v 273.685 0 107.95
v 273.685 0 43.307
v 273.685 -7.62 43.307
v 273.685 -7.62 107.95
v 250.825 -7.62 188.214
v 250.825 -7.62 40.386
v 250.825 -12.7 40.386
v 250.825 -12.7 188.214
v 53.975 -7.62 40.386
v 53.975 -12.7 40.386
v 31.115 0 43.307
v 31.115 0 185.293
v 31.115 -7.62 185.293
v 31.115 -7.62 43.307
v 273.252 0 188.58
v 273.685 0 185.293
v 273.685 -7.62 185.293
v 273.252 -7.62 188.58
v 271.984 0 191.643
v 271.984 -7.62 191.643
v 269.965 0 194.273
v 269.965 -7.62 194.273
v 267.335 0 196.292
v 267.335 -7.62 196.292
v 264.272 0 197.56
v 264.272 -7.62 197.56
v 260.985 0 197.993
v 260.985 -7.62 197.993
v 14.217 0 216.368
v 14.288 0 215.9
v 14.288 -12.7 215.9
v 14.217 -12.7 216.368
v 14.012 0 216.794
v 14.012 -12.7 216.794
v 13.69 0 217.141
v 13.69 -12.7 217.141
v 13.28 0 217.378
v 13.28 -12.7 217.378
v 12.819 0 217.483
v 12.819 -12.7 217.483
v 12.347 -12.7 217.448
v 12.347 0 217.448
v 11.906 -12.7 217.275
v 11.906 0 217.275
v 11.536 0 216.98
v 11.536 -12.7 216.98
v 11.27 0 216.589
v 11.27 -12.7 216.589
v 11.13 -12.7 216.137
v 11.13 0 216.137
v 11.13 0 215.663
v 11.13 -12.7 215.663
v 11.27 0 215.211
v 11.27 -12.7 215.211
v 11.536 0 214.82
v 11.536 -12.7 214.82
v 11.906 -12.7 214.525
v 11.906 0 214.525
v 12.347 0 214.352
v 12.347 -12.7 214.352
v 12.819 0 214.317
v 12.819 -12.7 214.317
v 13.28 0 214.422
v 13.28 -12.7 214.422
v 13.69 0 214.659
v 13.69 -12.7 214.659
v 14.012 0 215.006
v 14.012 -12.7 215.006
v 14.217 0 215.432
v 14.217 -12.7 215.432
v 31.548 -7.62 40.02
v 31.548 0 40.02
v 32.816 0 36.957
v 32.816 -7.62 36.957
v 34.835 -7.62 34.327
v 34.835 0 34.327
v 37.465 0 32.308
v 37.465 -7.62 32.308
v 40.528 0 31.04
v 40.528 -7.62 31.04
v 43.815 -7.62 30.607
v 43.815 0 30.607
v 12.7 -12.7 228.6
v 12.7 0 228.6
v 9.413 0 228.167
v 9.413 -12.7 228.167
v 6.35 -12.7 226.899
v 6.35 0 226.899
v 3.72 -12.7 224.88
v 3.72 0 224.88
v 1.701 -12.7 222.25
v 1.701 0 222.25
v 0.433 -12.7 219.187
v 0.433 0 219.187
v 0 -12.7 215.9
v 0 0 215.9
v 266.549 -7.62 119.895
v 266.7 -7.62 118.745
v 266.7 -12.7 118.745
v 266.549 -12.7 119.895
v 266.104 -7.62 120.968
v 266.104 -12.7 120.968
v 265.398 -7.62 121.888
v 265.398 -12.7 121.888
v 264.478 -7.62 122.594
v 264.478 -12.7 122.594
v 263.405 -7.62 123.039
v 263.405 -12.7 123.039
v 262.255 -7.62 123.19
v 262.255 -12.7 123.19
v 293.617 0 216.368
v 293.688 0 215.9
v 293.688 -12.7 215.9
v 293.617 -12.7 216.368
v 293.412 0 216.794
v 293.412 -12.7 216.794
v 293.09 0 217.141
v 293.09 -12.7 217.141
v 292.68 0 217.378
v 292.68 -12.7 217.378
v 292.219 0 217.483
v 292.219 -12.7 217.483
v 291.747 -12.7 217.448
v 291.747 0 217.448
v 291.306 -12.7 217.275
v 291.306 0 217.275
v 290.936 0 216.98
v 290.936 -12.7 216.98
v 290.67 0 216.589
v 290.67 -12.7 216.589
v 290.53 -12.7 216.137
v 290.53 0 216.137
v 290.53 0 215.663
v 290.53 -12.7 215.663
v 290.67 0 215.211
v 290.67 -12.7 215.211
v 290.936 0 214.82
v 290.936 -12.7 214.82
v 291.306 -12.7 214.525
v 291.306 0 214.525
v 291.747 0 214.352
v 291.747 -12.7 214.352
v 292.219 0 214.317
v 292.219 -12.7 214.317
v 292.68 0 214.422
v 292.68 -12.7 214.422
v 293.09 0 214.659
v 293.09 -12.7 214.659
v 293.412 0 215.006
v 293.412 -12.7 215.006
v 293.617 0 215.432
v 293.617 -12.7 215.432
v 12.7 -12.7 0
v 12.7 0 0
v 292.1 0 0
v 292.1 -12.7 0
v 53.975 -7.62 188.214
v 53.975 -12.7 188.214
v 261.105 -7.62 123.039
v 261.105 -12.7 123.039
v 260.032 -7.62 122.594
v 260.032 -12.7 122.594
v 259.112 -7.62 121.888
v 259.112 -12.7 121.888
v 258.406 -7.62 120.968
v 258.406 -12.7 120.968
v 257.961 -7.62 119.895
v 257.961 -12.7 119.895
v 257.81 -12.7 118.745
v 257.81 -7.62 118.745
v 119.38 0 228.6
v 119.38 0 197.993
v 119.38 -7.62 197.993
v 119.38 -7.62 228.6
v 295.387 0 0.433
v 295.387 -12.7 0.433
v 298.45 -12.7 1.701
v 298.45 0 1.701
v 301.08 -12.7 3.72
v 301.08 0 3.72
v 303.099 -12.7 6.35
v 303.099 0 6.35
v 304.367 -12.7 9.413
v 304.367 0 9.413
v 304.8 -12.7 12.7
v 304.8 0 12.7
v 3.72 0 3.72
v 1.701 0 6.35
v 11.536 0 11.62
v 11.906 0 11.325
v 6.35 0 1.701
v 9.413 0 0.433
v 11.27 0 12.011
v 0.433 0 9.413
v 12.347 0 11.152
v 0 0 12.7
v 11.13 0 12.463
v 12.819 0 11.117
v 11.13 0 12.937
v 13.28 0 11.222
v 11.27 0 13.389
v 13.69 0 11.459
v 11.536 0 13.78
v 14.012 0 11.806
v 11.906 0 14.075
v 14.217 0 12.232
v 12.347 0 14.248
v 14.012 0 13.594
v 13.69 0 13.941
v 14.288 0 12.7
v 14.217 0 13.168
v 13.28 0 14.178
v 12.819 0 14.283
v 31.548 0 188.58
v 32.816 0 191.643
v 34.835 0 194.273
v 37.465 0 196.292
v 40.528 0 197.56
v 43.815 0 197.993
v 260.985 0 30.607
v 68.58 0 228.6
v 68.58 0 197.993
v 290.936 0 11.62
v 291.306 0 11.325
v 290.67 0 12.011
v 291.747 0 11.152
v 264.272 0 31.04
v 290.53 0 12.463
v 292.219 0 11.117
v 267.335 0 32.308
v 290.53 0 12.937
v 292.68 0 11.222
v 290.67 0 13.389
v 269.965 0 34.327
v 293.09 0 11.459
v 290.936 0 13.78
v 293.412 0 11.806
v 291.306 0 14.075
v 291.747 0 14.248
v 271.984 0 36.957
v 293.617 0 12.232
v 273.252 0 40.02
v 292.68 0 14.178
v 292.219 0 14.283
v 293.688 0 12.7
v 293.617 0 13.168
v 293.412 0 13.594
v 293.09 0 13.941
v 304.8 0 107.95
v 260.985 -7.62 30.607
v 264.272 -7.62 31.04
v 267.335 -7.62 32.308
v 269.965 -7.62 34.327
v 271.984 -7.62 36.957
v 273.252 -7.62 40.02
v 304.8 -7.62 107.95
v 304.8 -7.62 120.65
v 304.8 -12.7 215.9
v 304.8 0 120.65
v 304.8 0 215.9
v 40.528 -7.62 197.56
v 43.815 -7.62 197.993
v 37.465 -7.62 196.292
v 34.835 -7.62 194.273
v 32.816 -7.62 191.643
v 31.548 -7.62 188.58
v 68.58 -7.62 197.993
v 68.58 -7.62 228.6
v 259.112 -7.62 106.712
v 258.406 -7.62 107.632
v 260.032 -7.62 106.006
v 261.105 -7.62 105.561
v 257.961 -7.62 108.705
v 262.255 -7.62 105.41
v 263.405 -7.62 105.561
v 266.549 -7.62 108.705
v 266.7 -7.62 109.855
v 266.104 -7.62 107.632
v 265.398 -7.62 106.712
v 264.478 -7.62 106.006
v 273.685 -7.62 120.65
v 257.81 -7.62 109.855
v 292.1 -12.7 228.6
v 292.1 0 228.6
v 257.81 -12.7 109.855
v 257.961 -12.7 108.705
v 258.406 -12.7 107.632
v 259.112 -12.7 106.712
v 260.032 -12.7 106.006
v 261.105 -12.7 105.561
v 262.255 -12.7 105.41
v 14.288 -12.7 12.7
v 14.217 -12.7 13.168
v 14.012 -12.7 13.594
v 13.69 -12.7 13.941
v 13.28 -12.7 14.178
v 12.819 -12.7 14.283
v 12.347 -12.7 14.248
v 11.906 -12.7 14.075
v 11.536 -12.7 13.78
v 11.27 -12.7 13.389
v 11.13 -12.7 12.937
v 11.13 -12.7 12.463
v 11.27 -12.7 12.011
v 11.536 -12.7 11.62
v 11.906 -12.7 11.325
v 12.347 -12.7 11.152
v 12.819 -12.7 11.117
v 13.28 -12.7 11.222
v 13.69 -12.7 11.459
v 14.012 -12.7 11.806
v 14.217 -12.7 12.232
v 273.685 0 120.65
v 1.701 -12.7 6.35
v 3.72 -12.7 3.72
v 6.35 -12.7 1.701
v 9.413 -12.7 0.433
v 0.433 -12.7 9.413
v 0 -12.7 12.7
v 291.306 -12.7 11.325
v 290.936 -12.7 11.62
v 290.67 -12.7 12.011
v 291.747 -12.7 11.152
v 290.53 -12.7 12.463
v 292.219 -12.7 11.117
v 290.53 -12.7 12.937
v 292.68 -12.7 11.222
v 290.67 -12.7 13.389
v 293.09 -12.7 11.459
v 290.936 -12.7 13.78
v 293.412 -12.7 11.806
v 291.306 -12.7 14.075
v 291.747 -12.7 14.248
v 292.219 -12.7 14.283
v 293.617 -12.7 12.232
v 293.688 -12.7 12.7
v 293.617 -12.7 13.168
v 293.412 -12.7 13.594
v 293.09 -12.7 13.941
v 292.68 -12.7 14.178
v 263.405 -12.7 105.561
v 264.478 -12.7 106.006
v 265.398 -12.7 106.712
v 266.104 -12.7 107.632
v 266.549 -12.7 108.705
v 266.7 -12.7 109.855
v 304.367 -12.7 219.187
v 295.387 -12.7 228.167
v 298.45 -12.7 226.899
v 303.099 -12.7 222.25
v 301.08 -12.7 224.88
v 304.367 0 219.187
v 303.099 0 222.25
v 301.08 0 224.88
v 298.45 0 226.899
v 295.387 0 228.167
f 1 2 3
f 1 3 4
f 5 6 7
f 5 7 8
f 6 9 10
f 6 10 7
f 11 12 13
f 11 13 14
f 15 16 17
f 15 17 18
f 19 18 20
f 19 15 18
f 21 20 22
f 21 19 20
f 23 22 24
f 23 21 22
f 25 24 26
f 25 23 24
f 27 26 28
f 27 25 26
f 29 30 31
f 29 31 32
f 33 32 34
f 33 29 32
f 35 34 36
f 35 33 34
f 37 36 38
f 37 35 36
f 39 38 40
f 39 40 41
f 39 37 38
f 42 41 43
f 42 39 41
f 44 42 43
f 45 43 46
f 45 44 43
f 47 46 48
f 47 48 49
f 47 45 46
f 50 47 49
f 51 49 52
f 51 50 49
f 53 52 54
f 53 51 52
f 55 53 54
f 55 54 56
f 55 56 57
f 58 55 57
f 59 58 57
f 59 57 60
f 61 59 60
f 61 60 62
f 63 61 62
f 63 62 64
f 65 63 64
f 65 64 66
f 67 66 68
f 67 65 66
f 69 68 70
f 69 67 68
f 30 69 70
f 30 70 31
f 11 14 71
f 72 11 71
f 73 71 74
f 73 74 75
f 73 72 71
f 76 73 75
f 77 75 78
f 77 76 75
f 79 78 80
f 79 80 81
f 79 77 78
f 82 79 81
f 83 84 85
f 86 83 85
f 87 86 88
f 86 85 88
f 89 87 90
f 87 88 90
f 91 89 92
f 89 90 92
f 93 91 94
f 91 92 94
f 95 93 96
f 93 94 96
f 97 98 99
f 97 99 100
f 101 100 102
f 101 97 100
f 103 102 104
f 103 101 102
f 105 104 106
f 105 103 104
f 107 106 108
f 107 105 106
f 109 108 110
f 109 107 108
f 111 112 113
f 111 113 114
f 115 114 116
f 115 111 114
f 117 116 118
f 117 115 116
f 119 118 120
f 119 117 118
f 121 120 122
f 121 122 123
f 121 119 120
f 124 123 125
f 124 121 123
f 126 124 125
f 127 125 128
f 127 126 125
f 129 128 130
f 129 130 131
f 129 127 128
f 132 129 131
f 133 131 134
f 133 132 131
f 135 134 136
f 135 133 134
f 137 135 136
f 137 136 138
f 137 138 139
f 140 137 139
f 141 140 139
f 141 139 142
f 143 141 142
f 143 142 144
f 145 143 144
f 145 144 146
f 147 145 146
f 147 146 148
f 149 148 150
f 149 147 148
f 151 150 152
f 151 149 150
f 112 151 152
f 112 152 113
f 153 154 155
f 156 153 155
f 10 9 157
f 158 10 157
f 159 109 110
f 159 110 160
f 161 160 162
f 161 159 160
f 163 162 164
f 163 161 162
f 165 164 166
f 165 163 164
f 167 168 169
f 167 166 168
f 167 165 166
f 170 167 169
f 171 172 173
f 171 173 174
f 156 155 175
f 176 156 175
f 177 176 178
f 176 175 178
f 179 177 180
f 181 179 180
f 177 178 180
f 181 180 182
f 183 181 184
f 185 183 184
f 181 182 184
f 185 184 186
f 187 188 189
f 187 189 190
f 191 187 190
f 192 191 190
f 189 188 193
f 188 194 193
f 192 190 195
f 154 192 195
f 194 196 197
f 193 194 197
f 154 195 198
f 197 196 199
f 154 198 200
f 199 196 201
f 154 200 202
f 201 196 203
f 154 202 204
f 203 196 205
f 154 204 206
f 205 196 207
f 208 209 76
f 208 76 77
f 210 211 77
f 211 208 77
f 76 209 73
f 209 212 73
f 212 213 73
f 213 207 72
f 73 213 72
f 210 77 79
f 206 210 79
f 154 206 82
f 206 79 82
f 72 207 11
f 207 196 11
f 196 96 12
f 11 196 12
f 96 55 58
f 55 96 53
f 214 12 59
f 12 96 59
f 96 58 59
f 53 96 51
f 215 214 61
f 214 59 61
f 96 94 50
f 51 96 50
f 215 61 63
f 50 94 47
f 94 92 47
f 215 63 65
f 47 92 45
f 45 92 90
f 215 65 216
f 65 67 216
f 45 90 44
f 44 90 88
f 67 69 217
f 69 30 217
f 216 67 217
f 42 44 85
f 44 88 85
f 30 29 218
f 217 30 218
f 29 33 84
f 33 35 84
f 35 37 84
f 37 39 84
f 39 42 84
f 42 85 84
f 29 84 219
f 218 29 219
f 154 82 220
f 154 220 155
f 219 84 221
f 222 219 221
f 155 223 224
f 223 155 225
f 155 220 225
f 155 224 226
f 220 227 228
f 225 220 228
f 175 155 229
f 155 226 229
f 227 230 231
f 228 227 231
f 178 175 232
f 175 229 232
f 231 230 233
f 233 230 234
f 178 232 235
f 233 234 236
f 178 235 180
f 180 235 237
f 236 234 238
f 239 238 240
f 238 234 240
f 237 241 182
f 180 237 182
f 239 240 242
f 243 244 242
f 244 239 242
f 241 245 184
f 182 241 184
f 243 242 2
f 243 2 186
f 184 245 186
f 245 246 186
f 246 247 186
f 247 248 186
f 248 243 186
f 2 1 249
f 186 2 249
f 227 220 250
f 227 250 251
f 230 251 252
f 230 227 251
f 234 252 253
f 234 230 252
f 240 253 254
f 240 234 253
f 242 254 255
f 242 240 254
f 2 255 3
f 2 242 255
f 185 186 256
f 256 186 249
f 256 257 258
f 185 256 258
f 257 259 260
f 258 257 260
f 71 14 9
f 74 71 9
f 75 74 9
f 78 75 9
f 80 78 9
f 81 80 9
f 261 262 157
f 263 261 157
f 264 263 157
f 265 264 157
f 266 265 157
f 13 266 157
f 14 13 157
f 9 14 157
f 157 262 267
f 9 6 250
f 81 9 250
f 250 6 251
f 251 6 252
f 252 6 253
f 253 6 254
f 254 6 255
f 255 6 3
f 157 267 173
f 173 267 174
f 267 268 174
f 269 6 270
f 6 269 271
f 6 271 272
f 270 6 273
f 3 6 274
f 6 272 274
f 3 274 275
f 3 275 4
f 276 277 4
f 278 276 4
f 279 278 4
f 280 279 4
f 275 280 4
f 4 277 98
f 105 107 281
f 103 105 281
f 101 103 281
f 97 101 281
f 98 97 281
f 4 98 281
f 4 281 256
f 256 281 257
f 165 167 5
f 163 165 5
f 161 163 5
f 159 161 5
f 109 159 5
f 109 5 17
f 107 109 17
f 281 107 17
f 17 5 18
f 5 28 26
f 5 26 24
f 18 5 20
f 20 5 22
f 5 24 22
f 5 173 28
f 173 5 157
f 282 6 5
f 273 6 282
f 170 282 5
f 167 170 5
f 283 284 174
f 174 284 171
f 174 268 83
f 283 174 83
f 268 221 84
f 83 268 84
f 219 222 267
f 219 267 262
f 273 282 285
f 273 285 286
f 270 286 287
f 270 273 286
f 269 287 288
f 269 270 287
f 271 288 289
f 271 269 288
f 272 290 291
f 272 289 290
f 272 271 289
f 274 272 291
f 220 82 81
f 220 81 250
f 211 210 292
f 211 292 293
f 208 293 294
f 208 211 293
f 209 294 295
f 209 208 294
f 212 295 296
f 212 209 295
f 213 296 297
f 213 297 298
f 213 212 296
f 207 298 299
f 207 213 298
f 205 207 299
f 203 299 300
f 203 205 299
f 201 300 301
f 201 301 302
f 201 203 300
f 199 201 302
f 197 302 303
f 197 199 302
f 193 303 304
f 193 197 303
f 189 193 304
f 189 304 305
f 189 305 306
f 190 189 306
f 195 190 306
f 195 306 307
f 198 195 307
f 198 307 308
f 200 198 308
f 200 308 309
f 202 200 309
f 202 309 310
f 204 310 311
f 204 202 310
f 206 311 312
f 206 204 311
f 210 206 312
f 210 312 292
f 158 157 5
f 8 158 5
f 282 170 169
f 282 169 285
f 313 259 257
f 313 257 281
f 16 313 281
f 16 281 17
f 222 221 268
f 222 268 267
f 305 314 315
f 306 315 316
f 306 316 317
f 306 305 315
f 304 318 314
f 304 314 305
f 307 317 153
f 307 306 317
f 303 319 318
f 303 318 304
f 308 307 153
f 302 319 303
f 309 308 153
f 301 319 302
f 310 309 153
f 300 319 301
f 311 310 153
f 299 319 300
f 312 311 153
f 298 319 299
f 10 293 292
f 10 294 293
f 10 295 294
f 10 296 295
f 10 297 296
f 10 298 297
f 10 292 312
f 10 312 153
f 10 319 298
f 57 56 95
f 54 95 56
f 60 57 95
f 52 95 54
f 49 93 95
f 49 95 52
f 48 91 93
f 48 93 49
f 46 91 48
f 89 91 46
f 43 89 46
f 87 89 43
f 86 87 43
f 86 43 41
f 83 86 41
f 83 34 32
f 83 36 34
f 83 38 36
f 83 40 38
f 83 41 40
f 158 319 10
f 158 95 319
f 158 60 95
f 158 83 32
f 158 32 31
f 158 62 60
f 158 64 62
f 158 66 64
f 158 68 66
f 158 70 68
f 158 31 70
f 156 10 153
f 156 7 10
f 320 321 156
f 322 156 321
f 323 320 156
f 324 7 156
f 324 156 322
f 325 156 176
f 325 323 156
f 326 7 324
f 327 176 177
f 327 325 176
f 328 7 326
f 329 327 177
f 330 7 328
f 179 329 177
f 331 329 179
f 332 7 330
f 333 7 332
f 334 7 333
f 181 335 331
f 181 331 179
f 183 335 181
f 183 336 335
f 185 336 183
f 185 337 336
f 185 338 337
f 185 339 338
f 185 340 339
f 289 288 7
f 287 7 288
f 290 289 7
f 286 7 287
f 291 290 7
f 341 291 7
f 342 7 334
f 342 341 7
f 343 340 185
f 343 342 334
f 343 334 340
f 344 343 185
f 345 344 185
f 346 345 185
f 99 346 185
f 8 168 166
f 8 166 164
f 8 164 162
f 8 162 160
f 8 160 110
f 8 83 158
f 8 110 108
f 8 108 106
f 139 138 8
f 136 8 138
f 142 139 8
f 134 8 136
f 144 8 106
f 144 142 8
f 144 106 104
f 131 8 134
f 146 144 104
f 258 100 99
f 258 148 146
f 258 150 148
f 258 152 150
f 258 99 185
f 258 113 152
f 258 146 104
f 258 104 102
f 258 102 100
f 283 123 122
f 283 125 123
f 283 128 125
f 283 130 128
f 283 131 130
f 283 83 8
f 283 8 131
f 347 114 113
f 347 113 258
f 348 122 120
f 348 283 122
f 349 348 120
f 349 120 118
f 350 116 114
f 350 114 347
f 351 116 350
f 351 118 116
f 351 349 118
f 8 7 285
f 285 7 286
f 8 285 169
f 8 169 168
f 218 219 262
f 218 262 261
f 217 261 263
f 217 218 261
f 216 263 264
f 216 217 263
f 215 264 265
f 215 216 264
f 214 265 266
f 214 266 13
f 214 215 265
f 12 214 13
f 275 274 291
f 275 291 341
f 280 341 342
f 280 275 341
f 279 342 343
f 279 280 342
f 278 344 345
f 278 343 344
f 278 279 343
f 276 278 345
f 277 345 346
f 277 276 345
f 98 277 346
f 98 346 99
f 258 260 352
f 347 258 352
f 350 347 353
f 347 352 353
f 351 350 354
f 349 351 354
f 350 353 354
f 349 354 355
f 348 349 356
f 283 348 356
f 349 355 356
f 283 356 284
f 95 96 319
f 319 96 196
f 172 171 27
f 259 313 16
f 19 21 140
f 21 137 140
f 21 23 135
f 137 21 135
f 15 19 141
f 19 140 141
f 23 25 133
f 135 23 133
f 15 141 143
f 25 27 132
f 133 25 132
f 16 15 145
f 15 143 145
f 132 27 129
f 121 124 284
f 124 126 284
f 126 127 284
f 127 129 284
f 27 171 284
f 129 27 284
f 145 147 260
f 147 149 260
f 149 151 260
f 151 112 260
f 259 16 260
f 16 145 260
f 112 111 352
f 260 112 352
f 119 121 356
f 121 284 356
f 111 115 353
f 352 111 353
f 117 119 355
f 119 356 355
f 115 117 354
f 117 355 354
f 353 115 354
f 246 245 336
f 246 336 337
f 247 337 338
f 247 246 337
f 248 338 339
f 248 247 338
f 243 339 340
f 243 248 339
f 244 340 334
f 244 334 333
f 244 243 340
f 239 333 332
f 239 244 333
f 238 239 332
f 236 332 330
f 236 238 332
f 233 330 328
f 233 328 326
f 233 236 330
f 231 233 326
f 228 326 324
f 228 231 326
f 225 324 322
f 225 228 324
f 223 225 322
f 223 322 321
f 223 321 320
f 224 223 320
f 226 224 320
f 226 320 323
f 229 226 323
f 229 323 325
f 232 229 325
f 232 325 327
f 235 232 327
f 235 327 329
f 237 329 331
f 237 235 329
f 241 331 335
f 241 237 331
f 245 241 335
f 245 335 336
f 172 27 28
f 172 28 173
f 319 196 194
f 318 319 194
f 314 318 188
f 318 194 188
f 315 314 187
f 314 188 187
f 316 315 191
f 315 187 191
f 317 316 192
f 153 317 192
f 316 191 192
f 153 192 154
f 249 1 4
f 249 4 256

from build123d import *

# Parameters (mm, degrees)
F0_R     = 1.5875
F1_DEPTH = 12.7
F3_DEPTH = 7.62
F4_W     = 196.85
F4_H     = 147.828
F4_R     = 1.5875
F5_DEPTH = 25.4


with BuildPart() as f1:
    # F0 (on Front) → F1 (new body)
    with BuildSketch(Plane.XZ):
        with BuildLine():
            Line((292.1, 228.6), (12.7, 228.6))
            ThreePointArc((12.7, 228.6), (3.719744, 224.880256), (0, 215.9))
            Line((0, 215.9), (0, 12.7))
            ThreePointArc((0, 12.7), (3.719744, 3.719744), (12.7, 0))
            Line((12.7, 0), (292.1, 0))
            ThreePointArc((292.1, 0), (301.080256, 3.719744), (304.8, 12.7))
            Line((304.8, 12.7), (304.8, 215.9))
            ThreePointArc((304.8, 215.9), (301.080256, 224.880256), (292.1, 228.6))
        make_face()
        with Locations((12.7, 12.7)):
            Circle(F0_R, mode=Mode.SUBTRACT)
        with Locations((292.1, 12.7)):
            Circle(F0_R, mode=Mode.SUBTRACT)
        with Locations((12.7, 215.9)):
            Circle(F0_R, mode=Mode.SUBTRACT)
        with Locations((292.1, 215.9)):
            Circle(F0_R, mode=Mode.SUBTRACT)
    extrude(amount=F1_DEPTH)

    # F2 (on face) → F3 (cut)
    with BuildSketch(Plane.XZ):
        with BuildLine():
            ThreePointArc((31.115, 43.307), (34.834744, 34.326744), (43.815, 30.607))
            Line((43.815, 30.607), (260.985, 30.607))
            ThreePointArc((260.985, 30.607), (269.965256, 34.326744), (273.685, 43.307))
            Line((273.685, 43.307), (273.685, 107.95))
            Line((273.685, 107.95), (304.8, 107.95))
            Line((304.8, 107.95), (304.8, 120.65))
            Line((304.8, 120.65), (273.685, 120.65))
            Line((273.685, 120.65), (273.685, 185.293))
            ThreePointArc((273.685, 185.293), (269.965256, 194.273256), (260.985, 197.993))
            Line((260.985, 197.993), (119.38, 197.993))
            Line((119.38, 197.993), (119.38, 228.6))
            Line((119.38, 228.6), (68.58, 228.6))
            Line((68.58, 228.6), (68.58, 197.993))
            Line((68.58, 197.993), (43.815, 197.993))
            ThreePointArc((43.815, 197.993), (34.834744, 194.273256), (31.115, 185.293))
            Line((31.115, 185.293), (31.115, 43.307))
        make_face()
    extrude(amount=F3_DEPTH, mode=Mode.SUBTRACT)

    # F4 (on face) → F5 (cut)
    with BuildSketch(Plane.XZ):
        with Locations((152.4, 114.3)):
            Rectangle(F4_W, F4_H)
        with BuildLine():
            Line((266.7, 109.855), (266.7, 118.745))
            ThreePointArc((266.7, 118.745), (265.39809, 121.88809), (262.255, 123.19))
            ThreePointArc((262.255, 123.19), (259.11191, 121.88809), (257.81, 118.745))
            Line((257.81, 118.745), (257.81, 109.855))
            ThreePointArc((257.81, 109.855), (259.11191, 106.71191), (262.255, 105.41))
            ThreePointArc((262.255, 105.41), (265.39809, 106.71191), (266.7, 109.855))
        make_face()
        with Locations((292.1, 215.9)):
            Circle(F4_R)
        with Locations((12.7, 215.9)):
            Circle(F4_R)
        with Locations((12.7, 12.7)):
            Circle(F4_R)
        with Locations((292.1, 12.7)):
            Circle(F4_R)
    extrude(amount=F5_DEPTH, mode=Mode.SUBTRACT)


solid = f1.part
